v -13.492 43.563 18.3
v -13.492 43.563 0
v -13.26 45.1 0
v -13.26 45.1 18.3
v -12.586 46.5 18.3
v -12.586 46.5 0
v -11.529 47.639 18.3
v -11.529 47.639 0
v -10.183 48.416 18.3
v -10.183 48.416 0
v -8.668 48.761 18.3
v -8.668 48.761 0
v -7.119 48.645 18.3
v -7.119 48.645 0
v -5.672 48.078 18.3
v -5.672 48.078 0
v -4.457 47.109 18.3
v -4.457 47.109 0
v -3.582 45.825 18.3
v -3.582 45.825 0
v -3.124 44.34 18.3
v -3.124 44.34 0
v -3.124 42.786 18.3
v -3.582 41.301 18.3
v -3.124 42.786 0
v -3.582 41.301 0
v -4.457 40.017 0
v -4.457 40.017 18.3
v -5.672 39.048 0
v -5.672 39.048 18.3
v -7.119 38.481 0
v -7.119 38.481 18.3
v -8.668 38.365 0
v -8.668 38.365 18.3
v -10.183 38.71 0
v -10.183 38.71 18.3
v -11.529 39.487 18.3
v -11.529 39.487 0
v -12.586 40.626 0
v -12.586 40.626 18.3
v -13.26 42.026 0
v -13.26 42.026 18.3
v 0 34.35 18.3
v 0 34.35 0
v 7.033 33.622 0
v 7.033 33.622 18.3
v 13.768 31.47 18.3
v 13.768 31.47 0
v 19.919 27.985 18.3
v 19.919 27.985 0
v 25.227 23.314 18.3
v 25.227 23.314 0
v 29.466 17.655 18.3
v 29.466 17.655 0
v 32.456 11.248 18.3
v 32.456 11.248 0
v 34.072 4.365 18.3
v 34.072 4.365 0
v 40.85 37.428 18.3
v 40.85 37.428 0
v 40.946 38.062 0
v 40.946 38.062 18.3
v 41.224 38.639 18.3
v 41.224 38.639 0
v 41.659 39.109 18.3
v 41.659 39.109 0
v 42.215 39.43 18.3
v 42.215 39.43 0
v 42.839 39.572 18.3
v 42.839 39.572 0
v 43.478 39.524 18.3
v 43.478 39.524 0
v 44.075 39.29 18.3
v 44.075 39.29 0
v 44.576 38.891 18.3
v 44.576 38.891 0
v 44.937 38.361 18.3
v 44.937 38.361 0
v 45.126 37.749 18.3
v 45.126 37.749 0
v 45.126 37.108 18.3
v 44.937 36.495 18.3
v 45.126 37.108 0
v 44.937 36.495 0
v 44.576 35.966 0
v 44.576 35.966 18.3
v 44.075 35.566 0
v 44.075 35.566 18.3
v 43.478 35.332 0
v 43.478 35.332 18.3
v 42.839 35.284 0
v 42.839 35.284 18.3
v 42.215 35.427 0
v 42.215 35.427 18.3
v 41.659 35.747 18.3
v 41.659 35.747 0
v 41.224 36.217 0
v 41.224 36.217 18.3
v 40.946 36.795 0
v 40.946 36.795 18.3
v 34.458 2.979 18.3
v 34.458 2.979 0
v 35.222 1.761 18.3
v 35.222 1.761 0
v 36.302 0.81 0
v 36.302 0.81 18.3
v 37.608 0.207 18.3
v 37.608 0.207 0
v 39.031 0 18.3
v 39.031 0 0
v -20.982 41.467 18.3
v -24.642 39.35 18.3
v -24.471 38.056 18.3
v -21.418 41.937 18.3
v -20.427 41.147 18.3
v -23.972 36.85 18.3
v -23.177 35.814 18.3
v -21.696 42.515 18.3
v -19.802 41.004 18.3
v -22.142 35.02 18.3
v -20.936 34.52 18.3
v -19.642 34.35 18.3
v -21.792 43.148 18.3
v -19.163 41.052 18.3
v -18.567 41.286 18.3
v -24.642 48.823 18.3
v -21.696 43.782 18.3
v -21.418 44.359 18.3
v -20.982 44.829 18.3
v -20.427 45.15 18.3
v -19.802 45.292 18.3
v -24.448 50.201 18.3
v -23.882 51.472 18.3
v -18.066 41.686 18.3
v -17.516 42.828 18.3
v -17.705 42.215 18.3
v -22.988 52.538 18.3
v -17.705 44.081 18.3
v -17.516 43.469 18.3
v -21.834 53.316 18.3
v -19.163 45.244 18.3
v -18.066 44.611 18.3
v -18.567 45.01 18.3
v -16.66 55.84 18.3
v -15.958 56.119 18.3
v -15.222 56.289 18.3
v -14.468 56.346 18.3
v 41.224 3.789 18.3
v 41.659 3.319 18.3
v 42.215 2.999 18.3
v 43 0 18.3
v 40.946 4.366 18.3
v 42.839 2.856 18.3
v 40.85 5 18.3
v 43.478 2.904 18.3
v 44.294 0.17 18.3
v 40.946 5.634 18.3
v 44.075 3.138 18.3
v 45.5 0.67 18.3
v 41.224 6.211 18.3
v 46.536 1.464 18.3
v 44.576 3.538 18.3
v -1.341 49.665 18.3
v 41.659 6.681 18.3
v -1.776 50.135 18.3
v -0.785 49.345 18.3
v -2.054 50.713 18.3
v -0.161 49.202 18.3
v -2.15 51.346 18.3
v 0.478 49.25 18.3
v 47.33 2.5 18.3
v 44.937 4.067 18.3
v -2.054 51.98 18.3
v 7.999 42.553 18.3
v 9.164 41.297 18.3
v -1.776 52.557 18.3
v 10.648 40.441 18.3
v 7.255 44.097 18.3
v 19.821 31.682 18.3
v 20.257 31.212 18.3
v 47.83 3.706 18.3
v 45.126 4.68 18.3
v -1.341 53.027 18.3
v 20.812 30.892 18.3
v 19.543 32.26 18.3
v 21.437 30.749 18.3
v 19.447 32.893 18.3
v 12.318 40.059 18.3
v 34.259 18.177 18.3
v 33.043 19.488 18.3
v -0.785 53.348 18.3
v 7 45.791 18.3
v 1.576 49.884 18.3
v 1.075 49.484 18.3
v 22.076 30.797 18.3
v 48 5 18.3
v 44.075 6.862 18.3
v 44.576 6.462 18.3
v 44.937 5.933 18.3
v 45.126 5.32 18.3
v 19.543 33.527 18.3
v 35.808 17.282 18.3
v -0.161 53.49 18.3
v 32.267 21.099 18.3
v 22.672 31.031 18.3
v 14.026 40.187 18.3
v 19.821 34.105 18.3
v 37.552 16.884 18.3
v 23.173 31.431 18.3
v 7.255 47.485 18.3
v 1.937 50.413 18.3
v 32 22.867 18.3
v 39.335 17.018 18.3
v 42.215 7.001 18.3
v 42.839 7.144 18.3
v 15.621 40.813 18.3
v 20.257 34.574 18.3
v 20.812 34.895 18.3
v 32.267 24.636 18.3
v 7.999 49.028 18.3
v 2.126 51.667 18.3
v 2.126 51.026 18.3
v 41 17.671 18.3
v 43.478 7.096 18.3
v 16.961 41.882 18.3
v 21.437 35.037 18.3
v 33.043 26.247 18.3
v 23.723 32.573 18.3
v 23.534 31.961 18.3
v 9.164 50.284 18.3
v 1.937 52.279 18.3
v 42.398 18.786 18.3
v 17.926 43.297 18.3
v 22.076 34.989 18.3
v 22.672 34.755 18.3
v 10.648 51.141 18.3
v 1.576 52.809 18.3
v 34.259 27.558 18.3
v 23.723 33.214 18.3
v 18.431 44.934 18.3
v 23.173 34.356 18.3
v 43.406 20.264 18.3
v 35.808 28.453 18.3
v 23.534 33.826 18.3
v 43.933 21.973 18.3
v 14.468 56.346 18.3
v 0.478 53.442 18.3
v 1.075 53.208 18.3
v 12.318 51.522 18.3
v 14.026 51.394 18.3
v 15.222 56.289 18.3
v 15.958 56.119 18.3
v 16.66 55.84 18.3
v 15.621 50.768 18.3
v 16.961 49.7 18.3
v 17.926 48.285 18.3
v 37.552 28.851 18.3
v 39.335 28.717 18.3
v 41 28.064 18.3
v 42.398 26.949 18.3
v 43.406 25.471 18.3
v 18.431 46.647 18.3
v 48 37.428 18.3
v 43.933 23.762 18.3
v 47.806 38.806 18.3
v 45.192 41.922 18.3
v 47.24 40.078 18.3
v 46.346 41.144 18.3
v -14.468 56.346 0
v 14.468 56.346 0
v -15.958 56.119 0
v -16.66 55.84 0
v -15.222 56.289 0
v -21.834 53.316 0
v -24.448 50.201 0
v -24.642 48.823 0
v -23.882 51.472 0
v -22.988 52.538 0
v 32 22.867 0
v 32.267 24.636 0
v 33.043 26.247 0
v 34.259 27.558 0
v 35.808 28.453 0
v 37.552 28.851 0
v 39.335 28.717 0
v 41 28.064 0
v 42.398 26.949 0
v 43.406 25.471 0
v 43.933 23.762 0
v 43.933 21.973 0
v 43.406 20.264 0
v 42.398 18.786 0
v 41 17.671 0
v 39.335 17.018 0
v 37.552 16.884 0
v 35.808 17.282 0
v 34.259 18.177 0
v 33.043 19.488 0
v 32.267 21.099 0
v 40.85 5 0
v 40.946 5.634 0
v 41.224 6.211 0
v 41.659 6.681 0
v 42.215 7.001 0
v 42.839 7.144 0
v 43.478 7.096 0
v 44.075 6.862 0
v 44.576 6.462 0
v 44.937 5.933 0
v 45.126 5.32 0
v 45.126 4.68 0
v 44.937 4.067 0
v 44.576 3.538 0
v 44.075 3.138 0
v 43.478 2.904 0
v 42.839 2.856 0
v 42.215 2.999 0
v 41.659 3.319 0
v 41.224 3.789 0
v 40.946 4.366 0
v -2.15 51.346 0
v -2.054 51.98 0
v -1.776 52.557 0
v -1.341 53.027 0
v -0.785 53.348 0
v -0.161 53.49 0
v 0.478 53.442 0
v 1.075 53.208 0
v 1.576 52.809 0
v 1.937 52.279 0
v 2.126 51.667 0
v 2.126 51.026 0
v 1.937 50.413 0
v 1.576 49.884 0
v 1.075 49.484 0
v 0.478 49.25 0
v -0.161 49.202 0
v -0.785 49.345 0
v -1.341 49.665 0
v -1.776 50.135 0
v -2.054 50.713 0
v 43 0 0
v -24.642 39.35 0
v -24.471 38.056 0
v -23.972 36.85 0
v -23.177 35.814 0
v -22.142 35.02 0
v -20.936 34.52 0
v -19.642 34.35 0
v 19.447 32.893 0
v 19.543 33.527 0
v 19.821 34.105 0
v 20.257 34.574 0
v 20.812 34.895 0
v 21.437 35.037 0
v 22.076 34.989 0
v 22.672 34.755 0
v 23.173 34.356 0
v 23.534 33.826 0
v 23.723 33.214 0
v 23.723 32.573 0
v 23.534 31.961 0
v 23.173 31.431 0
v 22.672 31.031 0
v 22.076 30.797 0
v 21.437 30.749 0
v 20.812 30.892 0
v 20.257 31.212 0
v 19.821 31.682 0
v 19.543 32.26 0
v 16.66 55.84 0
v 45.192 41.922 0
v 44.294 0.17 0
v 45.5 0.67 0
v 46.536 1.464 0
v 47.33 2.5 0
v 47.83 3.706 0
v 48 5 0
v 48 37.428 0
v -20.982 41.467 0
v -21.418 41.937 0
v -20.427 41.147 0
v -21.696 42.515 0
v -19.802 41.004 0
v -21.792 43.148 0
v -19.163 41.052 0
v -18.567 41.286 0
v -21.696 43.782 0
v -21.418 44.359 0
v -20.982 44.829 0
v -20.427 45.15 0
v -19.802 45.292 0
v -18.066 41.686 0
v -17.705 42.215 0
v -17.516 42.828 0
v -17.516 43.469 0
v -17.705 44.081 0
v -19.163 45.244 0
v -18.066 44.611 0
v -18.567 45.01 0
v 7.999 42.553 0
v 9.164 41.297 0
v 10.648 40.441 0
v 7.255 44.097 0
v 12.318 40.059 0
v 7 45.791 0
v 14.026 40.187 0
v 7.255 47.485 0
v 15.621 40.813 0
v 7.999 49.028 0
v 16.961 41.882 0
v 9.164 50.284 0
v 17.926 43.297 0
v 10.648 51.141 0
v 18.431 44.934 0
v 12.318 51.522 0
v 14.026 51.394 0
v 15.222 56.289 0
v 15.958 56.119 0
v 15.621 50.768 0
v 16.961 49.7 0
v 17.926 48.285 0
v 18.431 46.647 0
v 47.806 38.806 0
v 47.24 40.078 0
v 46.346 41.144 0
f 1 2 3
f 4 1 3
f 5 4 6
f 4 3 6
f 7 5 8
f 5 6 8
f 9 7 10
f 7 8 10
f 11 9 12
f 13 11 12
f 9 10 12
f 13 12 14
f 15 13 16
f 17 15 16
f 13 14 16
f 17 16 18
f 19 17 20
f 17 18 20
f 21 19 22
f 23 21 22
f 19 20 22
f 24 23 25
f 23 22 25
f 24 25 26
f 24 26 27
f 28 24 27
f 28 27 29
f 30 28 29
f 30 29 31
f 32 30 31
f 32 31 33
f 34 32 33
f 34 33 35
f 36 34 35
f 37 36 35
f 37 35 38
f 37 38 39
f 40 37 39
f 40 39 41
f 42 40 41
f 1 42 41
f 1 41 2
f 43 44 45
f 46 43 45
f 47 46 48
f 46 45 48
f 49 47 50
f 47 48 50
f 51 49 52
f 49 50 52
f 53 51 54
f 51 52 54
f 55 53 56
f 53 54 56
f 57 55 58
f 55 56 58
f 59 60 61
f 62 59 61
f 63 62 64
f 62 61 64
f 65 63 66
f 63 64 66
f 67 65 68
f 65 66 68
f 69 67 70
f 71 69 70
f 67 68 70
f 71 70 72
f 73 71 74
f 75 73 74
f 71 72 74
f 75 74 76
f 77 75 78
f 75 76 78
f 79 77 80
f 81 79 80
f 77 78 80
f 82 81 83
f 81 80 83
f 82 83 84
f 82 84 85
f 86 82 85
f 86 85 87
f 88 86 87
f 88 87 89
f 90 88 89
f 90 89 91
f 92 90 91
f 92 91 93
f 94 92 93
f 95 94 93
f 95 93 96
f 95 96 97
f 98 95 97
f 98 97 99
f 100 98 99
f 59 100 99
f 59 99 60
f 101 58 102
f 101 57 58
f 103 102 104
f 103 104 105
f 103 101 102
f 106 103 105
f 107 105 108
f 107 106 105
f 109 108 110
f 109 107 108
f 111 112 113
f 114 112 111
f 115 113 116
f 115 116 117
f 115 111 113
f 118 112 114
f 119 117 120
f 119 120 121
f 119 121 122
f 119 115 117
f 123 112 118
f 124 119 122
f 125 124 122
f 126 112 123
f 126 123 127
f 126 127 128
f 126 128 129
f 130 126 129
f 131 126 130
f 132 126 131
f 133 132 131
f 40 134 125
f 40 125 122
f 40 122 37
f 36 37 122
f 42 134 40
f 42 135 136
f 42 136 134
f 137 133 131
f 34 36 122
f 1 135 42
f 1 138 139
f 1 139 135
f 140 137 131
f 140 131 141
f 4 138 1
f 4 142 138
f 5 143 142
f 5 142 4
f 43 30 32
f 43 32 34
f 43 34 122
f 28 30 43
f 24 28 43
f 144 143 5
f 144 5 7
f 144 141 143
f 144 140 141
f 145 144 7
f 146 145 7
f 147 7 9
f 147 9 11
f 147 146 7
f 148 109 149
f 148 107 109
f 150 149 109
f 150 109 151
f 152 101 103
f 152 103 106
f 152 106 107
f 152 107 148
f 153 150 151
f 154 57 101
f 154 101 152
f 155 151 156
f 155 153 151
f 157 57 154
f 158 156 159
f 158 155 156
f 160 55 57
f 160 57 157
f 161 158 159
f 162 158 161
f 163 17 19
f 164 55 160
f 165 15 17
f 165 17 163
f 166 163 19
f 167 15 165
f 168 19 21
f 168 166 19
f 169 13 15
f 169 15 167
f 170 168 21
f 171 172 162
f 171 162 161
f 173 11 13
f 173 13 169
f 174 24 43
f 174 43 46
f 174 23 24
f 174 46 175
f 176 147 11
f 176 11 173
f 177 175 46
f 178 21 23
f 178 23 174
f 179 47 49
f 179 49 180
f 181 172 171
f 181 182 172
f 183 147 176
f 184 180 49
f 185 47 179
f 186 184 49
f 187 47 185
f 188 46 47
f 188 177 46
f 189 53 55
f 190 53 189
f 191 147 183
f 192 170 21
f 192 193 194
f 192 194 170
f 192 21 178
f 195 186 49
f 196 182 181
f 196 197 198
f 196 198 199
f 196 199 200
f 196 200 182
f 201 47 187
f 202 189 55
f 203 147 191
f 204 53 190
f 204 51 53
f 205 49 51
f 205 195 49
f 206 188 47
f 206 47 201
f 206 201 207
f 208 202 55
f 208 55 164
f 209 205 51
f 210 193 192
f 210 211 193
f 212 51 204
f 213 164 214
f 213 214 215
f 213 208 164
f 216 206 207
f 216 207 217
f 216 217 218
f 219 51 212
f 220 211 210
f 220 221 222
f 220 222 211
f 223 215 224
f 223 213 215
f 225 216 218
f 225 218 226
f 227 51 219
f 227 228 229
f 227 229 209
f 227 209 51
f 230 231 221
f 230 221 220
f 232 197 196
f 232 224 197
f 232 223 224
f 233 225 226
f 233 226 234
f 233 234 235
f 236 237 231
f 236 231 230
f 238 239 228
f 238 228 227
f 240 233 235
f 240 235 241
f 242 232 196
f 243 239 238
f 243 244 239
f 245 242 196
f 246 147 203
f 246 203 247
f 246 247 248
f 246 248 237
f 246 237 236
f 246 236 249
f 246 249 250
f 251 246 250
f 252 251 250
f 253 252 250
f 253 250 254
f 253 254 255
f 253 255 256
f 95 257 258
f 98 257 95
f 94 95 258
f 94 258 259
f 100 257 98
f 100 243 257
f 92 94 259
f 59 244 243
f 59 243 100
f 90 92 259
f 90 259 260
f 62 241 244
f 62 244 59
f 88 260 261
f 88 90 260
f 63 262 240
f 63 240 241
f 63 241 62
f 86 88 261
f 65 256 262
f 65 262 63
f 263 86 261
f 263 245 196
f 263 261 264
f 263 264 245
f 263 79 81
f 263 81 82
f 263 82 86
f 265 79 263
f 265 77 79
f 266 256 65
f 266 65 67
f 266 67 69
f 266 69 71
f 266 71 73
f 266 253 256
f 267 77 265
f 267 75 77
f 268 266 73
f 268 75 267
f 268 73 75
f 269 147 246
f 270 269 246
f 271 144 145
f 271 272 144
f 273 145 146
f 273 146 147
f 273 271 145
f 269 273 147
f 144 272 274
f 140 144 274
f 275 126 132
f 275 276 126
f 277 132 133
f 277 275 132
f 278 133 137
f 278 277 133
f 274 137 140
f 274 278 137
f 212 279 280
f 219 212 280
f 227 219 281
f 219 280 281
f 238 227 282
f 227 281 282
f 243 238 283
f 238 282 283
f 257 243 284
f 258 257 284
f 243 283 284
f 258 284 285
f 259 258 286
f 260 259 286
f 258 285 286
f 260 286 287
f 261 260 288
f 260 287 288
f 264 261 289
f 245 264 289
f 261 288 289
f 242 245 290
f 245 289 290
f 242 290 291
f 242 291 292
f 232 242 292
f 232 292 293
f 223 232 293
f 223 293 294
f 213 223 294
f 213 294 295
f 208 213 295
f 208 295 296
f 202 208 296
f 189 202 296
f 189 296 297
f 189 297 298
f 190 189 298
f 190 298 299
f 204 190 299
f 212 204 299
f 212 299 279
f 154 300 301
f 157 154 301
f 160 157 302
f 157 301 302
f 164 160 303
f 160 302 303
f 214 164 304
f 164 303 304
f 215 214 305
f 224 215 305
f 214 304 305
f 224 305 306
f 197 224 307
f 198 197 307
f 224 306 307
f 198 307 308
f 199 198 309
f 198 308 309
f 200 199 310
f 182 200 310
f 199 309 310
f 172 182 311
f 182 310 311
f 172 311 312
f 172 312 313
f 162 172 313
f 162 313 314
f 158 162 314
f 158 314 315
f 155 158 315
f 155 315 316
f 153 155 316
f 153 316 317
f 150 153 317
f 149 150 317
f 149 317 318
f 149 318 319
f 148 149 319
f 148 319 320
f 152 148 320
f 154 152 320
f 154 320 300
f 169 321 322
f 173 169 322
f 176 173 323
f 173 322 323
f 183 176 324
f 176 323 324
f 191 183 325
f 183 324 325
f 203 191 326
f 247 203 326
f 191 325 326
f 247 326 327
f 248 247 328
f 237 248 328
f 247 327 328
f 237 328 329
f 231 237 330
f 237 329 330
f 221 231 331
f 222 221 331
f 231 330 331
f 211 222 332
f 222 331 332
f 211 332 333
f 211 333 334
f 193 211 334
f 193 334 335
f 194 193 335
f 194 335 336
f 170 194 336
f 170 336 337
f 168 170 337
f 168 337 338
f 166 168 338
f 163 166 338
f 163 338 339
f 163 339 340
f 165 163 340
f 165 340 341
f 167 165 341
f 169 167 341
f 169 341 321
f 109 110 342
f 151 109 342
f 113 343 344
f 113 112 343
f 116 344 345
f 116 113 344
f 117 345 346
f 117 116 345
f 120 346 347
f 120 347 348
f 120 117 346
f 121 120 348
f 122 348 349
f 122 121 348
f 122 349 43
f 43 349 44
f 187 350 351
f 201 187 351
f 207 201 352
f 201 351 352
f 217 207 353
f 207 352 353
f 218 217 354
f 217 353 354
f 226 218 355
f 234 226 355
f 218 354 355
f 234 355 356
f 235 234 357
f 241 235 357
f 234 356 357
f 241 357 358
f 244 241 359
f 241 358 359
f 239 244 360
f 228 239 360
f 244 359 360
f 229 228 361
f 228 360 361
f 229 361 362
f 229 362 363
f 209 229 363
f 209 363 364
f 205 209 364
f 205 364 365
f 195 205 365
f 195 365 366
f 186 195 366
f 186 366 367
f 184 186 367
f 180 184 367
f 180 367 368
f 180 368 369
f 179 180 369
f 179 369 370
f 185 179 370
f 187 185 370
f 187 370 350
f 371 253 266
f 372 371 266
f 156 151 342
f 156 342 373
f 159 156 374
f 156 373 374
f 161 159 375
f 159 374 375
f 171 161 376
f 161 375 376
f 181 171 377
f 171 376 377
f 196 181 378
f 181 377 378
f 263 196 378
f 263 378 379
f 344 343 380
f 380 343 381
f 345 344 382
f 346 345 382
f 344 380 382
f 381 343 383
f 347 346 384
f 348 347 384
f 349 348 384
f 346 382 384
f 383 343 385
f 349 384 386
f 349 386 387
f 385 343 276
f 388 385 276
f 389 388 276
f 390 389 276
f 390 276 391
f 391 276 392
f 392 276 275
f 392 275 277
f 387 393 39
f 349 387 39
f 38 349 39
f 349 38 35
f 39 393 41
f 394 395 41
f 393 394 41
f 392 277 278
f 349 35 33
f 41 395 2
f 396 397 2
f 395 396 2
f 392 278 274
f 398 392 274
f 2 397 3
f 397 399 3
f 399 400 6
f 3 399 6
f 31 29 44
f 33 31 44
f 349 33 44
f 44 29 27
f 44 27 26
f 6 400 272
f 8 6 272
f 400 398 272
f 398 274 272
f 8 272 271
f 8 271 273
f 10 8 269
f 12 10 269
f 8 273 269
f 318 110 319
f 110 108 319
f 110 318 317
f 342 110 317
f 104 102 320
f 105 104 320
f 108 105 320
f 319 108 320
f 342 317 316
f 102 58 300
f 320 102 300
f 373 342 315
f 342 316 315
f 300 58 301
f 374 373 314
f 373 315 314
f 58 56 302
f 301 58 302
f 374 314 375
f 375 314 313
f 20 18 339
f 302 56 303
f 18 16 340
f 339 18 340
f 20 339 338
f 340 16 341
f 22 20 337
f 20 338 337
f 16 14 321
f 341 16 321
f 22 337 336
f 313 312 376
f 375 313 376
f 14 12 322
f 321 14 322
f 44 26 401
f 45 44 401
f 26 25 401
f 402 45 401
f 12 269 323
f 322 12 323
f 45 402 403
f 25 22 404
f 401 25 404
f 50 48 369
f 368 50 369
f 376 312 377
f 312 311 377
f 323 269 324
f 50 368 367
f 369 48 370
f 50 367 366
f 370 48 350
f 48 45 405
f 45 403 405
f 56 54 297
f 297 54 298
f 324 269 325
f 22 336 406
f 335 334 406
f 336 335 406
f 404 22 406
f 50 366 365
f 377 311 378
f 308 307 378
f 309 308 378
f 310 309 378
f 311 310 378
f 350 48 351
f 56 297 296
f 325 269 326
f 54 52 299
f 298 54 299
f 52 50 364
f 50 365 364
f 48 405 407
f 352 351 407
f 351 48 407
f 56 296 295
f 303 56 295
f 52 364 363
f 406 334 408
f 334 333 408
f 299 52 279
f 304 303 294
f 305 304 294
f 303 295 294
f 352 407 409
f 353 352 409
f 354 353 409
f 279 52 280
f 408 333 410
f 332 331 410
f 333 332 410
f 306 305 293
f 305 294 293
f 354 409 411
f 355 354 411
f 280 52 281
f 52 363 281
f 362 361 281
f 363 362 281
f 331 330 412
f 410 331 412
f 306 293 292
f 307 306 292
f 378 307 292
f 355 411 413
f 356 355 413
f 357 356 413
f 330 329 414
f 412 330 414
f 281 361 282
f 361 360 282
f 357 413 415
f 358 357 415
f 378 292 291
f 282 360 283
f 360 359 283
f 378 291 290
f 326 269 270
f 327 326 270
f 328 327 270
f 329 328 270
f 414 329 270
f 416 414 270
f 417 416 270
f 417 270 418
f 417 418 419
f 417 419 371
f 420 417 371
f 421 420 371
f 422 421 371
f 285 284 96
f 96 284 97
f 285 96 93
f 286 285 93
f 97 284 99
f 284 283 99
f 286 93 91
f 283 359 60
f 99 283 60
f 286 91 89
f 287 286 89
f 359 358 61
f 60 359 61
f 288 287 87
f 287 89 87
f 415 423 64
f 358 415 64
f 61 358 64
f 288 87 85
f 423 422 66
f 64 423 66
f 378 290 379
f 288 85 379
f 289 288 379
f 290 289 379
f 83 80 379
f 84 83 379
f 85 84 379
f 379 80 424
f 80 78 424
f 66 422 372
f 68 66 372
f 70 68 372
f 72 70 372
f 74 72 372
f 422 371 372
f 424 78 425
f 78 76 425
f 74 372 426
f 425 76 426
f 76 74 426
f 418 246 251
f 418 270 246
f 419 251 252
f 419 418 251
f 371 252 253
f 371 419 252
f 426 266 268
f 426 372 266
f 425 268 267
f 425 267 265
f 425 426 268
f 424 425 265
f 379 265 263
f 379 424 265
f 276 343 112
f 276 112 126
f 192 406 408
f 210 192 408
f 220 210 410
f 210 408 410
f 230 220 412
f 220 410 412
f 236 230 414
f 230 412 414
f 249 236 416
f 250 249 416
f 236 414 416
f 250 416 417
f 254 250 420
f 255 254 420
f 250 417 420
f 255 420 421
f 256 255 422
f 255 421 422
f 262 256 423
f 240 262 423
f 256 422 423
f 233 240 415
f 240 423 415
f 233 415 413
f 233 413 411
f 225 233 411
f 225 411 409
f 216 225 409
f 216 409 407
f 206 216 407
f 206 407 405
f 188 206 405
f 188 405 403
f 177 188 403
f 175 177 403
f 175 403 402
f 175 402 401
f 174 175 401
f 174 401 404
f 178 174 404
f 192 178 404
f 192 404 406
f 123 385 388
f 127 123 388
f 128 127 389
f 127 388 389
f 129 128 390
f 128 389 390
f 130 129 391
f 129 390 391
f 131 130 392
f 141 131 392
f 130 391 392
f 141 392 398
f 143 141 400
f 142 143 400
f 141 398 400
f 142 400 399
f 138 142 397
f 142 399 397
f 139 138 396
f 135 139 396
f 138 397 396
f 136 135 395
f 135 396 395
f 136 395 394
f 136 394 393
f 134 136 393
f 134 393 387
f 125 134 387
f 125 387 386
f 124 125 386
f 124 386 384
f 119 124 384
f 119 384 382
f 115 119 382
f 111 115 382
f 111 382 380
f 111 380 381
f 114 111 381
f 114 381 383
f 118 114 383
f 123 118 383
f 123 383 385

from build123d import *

# Parameters (mm, degrees)
SKETCH_1_R           = 6
EXTRUDE_1_DEPTH      = 18.3
CUT_EXTRUDE_1_DEPTH  = 18.3
CUT_EXTRUDE_2_DEPTH  = 18.3
CUT_EXTRUDE_3_DEPTH  = 18.3
FILLET_1_R           = 2
CUT_EXTRUDE_4_DEPTH  = 18.3
CUT_EXTRUDE_5_DEPTH  = 18.3
CUT_EXTRUDE_6_DEPTH  = 60
CUT_EXTRUDE_8_DEPTH  = 104
SKETCH_10_R          = 2.15
CUT_EXTRUDE_9_DEPTH  = 144
FILLET_2_R           = 5
SKETCH_13_R          = 6
SKETCH_13_R_2        = 5.747449745
SKETCH_13_R_3        = 5.213004259
CUT_EXTRUDE_11_DEPTH = 70


with BuildPart() as part:
    # 草图1 → 凸台-拉伸1 (new body)
    with BuildSketch(Plane.XY):
        with BuildLine():
            Line((-56, 0), (-34.35, 0))
            ThreePointArc((-34.35, 0), (0, 34.35), (34.35, 0))
            Line((34.35, 0), (56, 0))
            Line((56, 0), (56, 56.65))
            Line((56, 56.65), (8.281928864, 111.239451243))
            ThreePointArc((8.281928864, 111.239451243), (0, 115), (-8.281928864, 111.239451243))
            Line((-8.281928864, 111.239451243), (-56, 56.65))
            Line((-56, 56.65), (-56, 0))
        make_face()
        with Locations((0, 104)):
            Circle(SKETCH_1_R, mode=Mode.SUBTRACT)
    extrude(amount=EXTRUDE_1_DEPTH)

    # 草图2 → 切除-拉伸1 (cut)
    with BuildSketch(Plane(origin=(0, 0, 0), x_dir=(-1, 0, 0), z_dir=(0, 0, -1))):
        with BuildLine():
            Line((56, 34.35), (0, 34.35))
            ThreePointArc((0, 34.35), (24.289117934, 24.289117934), (34.35, 0))
            Line((34.35, 0), (56, 0))
            Line((56, 0), (56, 34.35))
        make_face()
    extrude(amount=-CUT_EXTRUDE_1_DEPTH, mode=Mode.SUBTRACT)

    # 草图3 → 切除-拉伸2 (cut)
    with BuildSketch(Plane(origin=(0, 0, 0), x_dir=(-1, 0, 0), z_dir=(0, 0, -1))):
        Polygon((41, 34.35), (41, 59.35), (9.317845696, 109.846174099), (56, 56.65), (56, 34.35), align=None)
    extrude(amount=-CUT_EXTRUDE_2_DEPTH, mode=Mode.SUBTRACT)

    # 草图4 → 切除-拉伸3 (cut)
    with BuildSketch(Plane.XY.offset(18.3)):
        Polygon((-9.317845696, 109.846174099), (-8.855036315, 110.583816584), (-56, 56.65), align=None)
    extrude(amount=-CUT_EXTRUDE_3_DEPTH, mode=Mode.SUBTRACT)

    # 圆角1
    fillet_1_edges = [part.edges().sort_by_distance(p)[0] for p in [
        (-41, 34.35, 9.15),
    ]]
    fillet(fillet_1_edges, radius=FILLET_1_R)

    # 草图5 → 切除-拉伸4 (cut)
    with BuildSketch(Plane(origin=(0, 0, 0), x_dir=(-1, 0, 0), z_dir=(0, 0, -1))):
        Polygon((24.641777725, 34.35), (24.641777725, 85.422331825), (54.641777725, 59.35), (54.641777725, 34.35), align=None)
    extrude(amount=-CUT_EXTRUDE_4_DEPTH, mode=Mode.SUBTRACT)

    # 草图6 → 切除-拉伸5 (cut)
    with BuildSketch(Plane.XY.offset(18.3)):
        Polygon((-24.641777725, 56.346305337), (15.622574059, 56.346305337), (54.315270896, 37.471819075), (54.315270896, 119.471819075), (-24.641777725, 119.471819075), align=None)
    extrude(amount=-CUT_EXTRUDE_5_DEPTH, mode=Mode.SUBTRACT)

    # 草图7 → 切除-拉伸6 (cut)
    with BuildSketch(Plane.XY.offset(18.3)):
        Polygon((-15.622574059, 56.346305337), (-24.641777725, 51.946693793), (-24.641777725, 56.346305337), align=None)
    extrude(amount=-CUT_EXTRUDE_6_DEPTH, mode=Mode.SUBTRACT)

    # 草图9 → 切除-拉伸8 (cut)
    with BuildSketch(Plane.XY.offset(18.3)):
        Polygon((48, 0), (48, 40.552439024), (56, 36.65), (56, 0), align=None)
    extrude(amount=-CUT_EXTRUDE_8_DEPTH, mode=Mode.SUBTRACT)


with BuildPart() as cut_extrude_8_piece_1:
    # of the separate pieces the step leaves, piece 1, a body of its own (cut_extrude_8_pieces)
    add(part.part.solids().sort_by_distance((-24.641777725, 34.35, 0))[0])

    # 草图10 → 切除-拉伸9 (cut)
    with BuildSketch(Plane(origin=(0, 0, 0), x_dir=(-1, 0, 0), z_dir=(0, 0, -1))):
        with Locations((-43, 5)):
            Circle(SKETCH_10_R)
        with Locations((-43, 37.428295255)):
            Circle(SKETCH_10_R)
        with Locations((0, 51.346305337)):
            Circle(SKETCH_10_R)
        with Locations((19.641777725, 43.148346896)):
            Circle(SKETCH_10_R)
        with Locations((-21.597406613, 32.893381213)):
            Circle(SKETCH_10_R)
    extrude(amount=-CUT_EXTRUDE_9_DEPTH, mode=Mode.SUBTRACT)

    # 圆角2
    fillet_2_edges = [cut_extrude_8_piece_1.edges().sort_by_distance(p)[0] for p in [
        (48, 0, 9.15),
        (34.35, 0, 9.15),
        (-24.641777725, 34.35, 9.15),
        (48, 40.552439024, 9.15),
        (15.622574059, 56.346305337, 9.15),
        (-15.622574059, 56.346305337, 9.15),
        (-24.641777725, 51.946693793, 9.15),
    ]]
    fillet(fillet_2_edges, radius=FILLET_2_R)

    # 草图13 → 切除-拉伸11 (cut)
    with BuildSketch(Plane(origin=(0, 0, 0), x_dir=(-1, 0, 0), z_dir=(0, 0, -1))):
        with Locations((-38, 22.86749877)):
            Circle(SKETCH_13_R)
        with Locations((-12.747449745, 45.790830958)):
            Circle(SKETCH_13_R_2)
        with Locations((8.278773466, 43.563004259)):
            Circle(SKETCH_13_R_3)
    extrude(amount=-CUT_EXTRUDE_11_DEPTH, mode=Mode.SUBTRACT)


with BuildPart() as cut_extrude_8_piece_2:
    # of the separate pieces the step leaves, piece 2, a body of its own (cut_extrude_8_pieces)
    add(part.part.solids().sort_by_distance((54.315270896, 37.471819075, 0))[0])


solid = cut_extrude_8_piece_1.part
